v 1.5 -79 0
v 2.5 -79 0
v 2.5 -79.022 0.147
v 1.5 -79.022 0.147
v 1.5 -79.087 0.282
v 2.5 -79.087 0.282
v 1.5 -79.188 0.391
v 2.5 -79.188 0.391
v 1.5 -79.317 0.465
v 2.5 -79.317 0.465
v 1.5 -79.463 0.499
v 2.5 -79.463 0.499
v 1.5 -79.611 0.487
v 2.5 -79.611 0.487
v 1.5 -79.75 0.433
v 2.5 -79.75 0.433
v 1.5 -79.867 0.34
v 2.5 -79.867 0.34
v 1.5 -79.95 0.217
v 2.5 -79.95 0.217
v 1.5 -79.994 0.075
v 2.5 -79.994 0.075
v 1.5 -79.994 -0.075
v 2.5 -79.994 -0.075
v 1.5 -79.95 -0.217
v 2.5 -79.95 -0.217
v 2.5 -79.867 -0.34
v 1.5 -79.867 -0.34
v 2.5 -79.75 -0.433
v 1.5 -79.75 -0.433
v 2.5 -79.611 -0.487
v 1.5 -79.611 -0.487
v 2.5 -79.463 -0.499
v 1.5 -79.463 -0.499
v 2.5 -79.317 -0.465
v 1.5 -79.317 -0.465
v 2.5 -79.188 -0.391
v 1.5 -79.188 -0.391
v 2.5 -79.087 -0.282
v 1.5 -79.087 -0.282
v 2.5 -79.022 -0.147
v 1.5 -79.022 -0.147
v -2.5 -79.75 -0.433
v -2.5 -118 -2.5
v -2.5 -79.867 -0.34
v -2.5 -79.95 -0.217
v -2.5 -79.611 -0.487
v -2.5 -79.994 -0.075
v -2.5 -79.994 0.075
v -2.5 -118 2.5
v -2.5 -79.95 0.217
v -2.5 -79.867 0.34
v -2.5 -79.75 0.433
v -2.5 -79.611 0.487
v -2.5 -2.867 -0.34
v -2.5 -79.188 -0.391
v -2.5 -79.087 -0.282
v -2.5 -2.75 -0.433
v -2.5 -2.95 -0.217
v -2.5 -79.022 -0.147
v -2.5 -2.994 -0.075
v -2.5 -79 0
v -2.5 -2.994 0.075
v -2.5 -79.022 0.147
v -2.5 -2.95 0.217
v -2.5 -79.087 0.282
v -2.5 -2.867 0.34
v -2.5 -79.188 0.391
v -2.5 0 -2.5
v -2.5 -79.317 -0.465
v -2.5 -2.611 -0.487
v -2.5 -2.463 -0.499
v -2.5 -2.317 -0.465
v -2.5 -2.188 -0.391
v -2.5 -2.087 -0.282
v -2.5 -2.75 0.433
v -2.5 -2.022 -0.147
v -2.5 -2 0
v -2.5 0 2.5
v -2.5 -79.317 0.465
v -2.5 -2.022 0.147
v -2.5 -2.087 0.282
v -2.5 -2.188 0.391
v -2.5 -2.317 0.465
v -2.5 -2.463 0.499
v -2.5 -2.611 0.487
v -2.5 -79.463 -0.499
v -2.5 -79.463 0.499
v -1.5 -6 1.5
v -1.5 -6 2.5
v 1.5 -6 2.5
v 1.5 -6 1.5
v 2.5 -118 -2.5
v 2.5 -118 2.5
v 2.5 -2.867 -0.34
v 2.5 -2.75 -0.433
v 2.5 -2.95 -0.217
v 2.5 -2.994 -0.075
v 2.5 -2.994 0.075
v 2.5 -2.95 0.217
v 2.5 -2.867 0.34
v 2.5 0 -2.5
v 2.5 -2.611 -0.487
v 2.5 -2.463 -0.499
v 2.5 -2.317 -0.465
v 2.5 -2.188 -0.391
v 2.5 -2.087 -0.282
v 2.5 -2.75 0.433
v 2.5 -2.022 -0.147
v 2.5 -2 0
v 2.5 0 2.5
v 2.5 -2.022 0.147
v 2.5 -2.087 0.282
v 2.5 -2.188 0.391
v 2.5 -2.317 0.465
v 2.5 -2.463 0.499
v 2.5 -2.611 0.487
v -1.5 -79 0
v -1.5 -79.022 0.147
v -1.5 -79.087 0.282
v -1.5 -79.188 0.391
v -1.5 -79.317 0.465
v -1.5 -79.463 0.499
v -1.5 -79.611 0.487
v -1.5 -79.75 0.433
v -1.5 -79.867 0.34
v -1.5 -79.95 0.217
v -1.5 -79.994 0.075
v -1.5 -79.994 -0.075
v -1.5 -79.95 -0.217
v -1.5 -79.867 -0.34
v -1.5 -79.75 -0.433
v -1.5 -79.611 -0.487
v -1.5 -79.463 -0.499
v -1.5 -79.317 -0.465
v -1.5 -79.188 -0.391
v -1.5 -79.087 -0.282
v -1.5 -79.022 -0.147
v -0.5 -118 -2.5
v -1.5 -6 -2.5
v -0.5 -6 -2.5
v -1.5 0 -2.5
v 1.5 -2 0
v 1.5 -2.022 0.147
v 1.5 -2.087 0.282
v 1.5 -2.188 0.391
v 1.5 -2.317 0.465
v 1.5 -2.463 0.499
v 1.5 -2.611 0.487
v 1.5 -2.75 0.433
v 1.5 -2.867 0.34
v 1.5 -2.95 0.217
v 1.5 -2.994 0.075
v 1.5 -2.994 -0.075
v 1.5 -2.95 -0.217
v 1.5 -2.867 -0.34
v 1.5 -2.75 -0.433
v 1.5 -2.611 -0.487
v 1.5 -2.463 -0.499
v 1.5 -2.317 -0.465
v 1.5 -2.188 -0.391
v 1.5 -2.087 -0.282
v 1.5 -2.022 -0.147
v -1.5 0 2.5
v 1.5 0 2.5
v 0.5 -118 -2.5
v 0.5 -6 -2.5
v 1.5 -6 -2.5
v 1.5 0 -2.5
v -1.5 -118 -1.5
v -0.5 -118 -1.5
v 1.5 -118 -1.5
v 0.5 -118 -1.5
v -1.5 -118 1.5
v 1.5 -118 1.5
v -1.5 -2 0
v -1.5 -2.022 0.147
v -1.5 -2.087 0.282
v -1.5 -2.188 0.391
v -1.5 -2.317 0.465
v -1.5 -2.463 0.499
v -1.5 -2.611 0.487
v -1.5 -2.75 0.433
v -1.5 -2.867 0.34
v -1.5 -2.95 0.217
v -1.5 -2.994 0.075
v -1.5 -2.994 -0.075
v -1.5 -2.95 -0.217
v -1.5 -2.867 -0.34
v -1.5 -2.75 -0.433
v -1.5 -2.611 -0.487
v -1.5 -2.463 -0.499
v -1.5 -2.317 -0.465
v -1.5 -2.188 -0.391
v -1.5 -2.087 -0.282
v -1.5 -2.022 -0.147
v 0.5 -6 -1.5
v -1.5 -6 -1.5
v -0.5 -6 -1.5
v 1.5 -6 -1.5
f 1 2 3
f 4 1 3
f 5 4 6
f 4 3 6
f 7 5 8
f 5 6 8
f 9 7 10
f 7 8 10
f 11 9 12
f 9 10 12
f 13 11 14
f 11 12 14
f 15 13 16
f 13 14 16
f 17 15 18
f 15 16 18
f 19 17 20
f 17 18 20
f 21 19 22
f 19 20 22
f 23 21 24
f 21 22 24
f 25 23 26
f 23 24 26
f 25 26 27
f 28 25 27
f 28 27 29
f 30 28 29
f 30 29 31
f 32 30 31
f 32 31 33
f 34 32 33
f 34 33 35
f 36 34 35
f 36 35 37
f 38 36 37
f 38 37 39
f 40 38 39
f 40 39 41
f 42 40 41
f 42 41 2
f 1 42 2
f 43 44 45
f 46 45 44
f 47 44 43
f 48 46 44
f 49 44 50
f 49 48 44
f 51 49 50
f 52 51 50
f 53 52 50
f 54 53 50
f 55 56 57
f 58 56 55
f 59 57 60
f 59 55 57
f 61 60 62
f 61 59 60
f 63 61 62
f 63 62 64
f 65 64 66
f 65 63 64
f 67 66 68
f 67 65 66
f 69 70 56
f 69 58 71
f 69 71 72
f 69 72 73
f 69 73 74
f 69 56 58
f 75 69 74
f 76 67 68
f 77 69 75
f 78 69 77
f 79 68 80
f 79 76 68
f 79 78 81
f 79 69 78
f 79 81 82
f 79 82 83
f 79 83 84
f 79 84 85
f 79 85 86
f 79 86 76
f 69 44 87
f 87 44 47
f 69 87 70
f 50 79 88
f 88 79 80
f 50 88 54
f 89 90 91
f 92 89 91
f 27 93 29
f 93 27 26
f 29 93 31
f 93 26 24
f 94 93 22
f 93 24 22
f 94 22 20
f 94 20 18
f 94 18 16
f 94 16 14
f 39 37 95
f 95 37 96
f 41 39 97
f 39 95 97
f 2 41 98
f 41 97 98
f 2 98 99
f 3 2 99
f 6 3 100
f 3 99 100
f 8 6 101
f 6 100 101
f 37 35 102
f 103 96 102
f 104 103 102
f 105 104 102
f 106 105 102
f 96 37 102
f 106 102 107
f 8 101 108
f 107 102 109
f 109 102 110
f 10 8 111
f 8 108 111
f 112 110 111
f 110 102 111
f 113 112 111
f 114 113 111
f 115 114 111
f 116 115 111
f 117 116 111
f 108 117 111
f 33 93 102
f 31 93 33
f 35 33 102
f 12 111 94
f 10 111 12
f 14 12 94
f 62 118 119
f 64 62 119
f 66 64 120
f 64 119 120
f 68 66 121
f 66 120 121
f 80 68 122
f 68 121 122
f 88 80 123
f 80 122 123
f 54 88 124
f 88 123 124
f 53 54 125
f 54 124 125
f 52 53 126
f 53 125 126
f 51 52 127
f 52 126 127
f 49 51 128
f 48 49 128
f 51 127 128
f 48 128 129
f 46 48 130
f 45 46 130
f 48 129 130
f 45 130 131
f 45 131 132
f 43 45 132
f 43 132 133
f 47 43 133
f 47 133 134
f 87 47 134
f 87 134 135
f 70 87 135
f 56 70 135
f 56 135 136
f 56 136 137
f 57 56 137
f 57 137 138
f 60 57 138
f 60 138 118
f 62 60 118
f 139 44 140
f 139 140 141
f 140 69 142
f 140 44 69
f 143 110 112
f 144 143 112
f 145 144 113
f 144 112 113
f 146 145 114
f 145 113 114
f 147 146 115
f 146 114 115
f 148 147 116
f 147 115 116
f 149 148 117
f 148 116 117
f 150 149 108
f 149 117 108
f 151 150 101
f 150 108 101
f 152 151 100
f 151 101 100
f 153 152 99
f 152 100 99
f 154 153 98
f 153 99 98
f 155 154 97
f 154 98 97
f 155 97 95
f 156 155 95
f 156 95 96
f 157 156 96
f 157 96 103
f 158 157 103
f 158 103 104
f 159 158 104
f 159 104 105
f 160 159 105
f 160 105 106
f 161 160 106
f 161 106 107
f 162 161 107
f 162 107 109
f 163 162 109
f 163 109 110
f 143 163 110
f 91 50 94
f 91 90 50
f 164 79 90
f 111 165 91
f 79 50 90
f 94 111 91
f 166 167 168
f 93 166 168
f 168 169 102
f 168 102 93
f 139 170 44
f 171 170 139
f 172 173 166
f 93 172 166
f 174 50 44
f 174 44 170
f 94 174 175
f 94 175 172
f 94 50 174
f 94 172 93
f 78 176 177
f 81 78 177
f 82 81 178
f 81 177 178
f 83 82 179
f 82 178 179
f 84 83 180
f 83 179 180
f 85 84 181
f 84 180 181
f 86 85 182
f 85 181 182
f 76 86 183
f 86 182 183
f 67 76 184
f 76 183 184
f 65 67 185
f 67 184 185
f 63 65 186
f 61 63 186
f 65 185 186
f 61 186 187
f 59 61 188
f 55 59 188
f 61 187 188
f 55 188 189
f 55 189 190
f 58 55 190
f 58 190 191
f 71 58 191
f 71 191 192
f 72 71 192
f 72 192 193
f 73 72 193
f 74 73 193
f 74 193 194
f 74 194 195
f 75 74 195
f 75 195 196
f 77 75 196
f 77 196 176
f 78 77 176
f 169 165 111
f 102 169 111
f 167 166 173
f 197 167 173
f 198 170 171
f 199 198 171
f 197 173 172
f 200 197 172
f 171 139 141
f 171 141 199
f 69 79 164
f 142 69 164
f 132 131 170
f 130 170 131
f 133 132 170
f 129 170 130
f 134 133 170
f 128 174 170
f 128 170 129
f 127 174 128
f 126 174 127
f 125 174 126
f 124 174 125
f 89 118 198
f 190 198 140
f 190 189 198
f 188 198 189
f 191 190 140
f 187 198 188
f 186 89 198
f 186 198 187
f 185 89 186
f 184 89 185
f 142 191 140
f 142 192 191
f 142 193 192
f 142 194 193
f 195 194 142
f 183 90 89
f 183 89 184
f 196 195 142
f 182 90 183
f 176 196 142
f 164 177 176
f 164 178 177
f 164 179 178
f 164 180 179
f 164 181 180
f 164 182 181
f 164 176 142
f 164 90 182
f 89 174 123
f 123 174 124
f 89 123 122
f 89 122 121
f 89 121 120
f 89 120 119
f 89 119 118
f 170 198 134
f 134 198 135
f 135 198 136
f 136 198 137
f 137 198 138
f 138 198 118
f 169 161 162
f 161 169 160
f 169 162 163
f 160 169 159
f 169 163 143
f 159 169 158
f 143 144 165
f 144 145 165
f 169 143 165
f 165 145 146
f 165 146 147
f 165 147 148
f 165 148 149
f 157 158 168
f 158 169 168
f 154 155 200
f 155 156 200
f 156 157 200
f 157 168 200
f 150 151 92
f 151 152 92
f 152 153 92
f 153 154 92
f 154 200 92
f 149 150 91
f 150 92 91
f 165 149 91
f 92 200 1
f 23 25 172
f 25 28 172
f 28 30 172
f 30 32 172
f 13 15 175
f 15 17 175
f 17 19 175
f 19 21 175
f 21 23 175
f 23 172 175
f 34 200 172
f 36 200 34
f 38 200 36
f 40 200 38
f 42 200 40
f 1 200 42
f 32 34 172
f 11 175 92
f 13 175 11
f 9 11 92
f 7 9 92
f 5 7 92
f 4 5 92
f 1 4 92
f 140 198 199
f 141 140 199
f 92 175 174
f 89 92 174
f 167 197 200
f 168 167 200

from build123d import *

# Parameters (mm, degrees)
F0_W     = 5
F0_H     = 5
F1_DEPTH = 118
F2_W     = 1
F2_H     = 1
F3_DEPTH = 118.001
F4_R     = 0.5
F5_DEPTH = 5.001
F6_R     = 0.5
F7_DEPTH = 5.001
F8_W     = 3
F8_H     = 6
F9_DEPTH = 5.001


with BuildPart() as f1:
    # F0 (on Front) → F1 (new body)
    with BuildSketch(Plane.XZ):
        Rectangle(F0_W, F0_H)
    extrude(amount=F1_DEPTH)

    # F2 (on face) → F3 (cut, through all)
    with BuildSketch(Plane.XZ.offset(118)):
        Polygon((0.5, -1.5), (1.5, -1.5), (1.5, 1.5), (-1.5, 1.5), (-1.5, -1.5), (-0.5, -1.5), align=None)
        with Locations((0, -2)):
            Rectangle(F2_W, F2_H)
    extrude(amount=-F3_DEPTH, mode=Mode.SUBTRACT)

    # F4 (on face) → F5 (cut, through all)
    with BuildSketch(Plane.YZ.offset(2.5)):
        with Locations((-79.5, 0)):
            Circle(F4_R)
    extrude(amount=-F5_DEPTH, mode=Mode.SUBTRACT)

    # F6 (on face) → F7 (cut, through all)
    with BuildSketch(Plane.YZ.offset(2.5)):
        with Locations((-2.5, 0)):
            Circle(F6_R)
    extrude(amount=-F7_DEPTH, mode=Mode.SUBTRACT)

    # F8 (on face) → F9 (cut, through all)
    with BuildSketch(Plane.XY.offset(2.5)):
        with Locations((0, -3)):
            Rectangle(F8_W, F8_H)
    extrude(amount=-F9_DEPTH, mode=Mode.SUBTRACT)


solid = f1.part
